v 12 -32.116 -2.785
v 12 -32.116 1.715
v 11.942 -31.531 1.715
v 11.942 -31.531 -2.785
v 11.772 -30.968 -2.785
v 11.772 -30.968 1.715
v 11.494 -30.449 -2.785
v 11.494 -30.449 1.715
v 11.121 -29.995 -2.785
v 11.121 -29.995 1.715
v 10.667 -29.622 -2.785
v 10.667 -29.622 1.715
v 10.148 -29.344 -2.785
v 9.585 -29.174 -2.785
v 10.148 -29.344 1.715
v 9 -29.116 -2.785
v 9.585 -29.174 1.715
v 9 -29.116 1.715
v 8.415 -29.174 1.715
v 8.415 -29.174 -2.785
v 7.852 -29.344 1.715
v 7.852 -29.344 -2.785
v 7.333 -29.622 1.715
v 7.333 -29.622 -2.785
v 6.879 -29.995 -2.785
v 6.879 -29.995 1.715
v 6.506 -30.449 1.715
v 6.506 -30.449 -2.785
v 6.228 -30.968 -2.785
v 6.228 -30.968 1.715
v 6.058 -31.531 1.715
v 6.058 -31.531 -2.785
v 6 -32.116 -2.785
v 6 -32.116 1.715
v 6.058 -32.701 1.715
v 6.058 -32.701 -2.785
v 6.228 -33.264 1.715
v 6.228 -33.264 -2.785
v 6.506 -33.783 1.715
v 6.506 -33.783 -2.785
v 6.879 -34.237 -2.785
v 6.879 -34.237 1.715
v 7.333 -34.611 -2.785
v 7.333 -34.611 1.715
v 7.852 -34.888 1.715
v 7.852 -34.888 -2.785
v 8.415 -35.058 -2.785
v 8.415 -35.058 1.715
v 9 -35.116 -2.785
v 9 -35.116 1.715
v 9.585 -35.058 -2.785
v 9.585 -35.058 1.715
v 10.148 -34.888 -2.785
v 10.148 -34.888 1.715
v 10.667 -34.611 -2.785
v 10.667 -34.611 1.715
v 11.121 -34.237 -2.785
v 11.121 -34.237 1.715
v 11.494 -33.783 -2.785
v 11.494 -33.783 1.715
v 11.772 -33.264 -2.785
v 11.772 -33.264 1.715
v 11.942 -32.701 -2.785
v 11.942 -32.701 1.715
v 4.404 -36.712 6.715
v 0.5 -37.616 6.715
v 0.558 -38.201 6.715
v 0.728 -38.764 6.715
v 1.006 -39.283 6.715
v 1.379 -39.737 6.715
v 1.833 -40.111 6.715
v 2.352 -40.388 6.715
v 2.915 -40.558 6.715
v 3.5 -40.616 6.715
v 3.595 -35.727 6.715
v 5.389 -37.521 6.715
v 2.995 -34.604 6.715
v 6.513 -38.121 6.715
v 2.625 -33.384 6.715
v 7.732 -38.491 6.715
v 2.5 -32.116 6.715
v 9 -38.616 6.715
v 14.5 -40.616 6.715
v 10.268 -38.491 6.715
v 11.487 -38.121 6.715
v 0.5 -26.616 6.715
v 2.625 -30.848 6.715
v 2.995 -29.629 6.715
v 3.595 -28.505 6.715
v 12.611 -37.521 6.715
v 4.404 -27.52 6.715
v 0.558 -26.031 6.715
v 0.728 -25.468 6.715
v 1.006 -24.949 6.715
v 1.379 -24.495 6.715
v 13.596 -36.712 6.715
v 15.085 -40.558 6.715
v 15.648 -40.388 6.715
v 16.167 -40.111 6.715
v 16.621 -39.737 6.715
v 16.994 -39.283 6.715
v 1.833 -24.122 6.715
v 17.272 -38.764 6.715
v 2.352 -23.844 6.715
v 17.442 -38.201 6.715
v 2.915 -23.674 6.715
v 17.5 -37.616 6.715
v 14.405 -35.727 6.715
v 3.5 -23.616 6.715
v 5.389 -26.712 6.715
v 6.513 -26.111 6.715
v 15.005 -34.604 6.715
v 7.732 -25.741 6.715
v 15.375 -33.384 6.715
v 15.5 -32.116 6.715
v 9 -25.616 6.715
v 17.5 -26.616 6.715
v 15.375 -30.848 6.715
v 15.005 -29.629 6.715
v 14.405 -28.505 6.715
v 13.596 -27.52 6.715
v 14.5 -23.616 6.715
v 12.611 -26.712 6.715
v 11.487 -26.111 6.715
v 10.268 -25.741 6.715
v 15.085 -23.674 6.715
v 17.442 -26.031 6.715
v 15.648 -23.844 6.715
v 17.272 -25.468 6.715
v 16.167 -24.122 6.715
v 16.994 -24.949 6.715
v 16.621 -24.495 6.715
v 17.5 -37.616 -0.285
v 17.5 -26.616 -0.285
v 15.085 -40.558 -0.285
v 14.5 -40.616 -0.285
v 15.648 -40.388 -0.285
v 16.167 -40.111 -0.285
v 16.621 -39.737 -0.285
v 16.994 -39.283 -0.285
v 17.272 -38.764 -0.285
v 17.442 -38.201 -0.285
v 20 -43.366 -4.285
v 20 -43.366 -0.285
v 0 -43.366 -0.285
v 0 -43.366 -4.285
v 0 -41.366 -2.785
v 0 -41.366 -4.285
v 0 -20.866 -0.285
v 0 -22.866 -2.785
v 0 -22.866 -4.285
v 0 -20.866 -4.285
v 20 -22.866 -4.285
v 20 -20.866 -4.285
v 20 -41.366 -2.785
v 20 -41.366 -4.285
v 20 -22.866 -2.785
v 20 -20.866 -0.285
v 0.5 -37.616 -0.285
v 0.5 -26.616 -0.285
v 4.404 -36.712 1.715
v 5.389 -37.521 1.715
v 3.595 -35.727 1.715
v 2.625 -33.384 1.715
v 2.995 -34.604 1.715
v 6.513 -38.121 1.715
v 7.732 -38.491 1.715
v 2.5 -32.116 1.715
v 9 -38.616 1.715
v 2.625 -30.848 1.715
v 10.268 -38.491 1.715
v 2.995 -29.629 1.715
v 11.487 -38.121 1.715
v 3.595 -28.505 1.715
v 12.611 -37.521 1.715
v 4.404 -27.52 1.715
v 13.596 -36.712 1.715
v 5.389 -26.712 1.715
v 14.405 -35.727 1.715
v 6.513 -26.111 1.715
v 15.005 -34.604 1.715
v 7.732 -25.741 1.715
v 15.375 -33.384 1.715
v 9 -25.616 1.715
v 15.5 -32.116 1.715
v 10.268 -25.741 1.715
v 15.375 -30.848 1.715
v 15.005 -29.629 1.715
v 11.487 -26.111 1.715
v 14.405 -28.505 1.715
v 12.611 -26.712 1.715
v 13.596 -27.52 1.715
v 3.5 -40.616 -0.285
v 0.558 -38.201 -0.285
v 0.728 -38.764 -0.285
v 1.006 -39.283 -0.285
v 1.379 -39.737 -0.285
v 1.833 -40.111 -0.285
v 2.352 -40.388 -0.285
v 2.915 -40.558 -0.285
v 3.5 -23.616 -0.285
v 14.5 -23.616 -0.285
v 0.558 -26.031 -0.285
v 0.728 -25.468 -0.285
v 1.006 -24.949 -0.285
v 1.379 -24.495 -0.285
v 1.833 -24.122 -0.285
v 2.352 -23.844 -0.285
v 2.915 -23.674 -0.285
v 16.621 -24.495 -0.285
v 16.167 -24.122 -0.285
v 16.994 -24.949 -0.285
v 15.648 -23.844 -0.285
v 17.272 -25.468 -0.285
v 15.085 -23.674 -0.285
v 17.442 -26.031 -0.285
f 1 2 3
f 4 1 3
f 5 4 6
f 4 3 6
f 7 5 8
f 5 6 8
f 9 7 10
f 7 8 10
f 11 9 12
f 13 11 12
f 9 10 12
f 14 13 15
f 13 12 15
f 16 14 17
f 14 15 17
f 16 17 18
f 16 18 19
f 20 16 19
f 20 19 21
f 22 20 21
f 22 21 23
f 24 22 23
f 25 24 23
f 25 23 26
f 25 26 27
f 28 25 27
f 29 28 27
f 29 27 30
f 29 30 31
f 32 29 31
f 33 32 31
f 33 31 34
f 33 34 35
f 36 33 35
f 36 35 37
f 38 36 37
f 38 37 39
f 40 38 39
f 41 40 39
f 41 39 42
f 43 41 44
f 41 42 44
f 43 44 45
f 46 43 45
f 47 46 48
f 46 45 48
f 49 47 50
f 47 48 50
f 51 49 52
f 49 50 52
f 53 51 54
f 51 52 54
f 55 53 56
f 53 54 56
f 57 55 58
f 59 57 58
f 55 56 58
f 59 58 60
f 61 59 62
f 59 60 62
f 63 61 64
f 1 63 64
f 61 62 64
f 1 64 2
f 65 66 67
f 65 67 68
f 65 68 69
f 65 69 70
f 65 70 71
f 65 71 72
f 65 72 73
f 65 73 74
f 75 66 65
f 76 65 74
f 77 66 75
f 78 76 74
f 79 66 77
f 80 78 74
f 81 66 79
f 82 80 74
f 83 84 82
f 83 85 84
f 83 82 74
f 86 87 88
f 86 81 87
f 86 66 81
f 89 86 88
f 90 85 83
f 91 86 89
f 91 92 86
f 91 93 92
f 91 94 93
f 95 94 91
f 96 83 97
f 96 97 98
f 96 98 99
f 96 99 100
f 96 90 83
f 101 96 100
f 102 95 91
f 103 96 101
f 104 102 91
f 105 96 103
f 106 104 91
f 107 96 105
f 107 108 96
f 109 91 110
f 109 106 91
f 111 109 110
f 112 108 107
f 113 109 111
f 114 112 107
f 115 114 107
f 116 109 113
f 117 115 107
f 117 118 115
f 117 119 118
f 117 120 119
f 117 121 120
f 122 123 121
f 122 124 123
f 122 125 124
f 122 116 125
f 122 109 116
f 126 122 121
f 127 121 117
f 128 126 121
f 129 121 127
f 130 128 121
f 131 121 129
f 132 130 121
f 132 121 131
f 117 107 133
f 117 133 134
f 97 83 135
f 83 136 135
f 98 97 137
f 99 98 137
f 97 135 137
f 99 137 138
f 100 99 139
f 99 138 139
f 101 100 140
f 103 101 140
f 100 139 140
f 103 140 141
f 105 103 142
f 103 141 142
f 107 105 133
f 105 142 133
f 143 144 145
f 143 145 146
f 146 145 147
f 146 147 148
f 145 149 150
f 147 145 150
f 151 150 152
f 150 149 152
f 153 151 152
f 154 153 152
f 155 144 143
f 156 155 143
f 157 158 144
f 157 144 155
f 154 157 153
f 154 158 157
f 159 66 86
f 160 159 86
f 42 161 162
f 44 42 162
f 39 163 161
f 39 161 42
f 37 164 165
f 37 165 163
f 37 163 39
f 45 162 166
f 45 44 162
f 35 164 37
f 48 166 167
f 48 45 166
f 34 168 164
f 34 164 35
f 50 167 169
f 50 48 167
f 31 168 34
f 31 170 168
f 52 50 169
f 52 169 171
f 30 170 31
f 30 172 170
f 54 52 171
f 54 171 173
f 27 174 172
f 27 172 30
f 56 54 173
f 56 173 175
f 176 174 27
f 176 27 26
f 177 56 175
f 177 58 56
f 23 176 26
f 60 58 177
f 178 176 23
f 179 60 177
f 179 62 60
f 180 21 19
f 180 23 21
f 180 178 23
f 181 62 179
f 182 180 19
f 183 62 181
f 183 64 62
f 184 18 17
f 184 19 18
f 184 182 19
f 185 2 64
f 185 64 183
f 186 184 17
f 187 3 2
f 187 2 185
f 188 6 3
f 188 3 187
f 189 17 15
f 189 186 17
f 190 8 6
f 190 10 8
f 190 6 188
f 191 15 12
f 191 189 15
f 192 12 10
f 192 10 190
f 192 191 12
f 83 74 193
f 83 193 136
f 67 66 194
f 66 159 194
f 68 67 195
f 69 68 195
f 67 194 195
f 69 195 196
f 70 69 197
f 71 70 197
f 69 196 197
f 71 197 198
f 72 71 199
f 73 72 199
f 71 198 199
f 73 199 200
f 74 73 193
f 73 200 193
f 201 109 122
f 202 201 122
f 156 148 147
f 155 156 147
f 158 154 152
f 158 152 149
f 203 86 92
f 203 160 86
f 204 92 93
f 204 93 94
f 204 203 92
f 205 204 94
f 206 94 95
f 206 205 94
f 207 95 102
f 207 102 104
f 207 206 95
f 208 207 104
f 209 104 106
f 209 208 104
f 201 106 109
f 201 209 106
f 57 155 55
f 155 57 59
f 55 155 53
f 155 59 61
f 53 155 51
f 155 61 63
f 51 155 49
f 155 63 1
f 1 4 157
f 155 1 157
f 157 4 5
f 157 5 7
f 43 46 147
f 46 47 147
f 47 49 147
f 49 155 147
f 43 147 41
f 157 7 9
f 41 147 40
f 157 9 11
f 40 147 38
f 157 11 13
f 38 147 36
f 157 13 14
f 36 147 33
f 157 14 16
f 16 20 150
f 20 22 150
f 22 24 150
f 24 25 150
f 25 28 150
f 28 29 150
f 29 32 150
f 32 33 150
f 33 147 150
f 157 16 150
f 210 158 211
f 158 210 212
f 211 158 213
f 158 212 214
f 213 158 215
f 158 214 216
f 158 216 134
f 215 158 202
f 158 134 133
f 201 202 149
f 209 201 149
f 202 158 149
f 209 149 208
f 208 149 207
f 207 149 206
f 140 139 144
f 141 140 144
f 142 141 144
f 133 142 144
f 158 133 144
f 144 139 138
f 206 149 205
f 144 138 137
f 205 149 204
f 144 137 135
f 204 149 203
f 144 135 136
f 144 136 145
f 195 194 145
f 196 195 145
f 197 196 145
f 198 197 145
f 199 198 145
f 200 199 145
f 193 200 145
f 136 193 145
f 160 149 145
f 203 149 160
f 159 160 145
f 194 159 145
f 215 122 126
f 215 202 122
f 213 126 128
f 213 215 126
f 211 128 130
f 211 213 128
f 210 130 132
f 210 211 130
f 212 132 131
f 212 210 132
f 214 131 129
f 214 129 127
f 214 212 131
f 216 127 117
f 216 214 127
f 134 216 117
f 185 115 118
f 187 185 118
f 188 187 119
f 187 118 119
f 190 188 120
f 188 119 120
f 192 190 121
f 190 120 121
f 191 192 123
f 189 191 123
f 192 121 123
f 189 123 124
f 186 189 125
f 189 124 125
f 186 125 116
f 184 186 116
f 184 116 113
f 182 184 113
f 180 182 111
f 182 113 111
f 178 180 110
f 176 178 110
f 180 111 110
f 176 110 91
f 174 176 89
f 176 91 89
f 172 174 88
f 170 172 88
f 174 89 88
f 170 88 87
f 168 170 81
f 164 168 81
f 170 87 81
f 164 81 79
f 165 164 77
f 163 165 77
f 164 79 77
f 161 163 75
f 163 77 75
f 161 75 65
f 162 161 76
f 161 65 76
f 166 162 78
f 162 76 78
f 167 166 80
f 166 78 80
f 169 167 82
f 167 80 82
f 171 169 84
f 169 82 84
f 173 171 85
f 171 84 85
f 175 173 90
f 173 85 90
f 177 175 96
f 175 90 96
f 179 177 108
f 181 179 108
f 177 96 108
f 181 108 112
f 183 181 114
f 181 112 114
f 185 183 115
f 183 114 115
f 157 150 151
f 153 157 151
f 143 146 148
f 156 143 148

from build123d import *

# Parameters (mm, degrees)
BOSS_EXTRUDE1_DEPTH = 20
SKETCH2_R           = 3
CUT_EXTRUDE1_DEPTH  = 3
BOSS_EXTRUDE2_START = 7
SKETCH3_W           = 17
SKETCH3_H           = 17
SKETCH3_R           = 3
BOSS_EXTRUDE2_DEPTH = 7
SKETCH4_R           = 6.5
CUT_EXTRUDE2_DEPTH  = 5
FILLET1_R           = 3


with BuildPart() as part:
    # Sketch1 → Boss-Extrude1 (new body)
    with BuildSketch(Plane(origin=(0, 0, 0), x_dir=(0, 0, -1), z_dir=(1, 0, 0))):
        Polygon((2.785388085, -22.866116346), (4.285388085, -22.866116346), (4.285388085, -20.866116346), (0.285388085, -20.866116346), (0.285388085, -43.366116346), (4.285388085, -43.366116346), (4.285388085, -41.366116346), (2.785388085, -41.366116346), align=None)
    extrude(amount=BOSS_EXTRUDE1_DEPTH)

    # Sketch2 → Cut-Extrude1 (cut)
    with BuildSketch(Plane.XY.offset(-0.285388085)):
        with Locations((9, -32.116116346)):
            Circle(SKETCH2_R)
    extrude(amount=-CUT_EXTRUDE1_DEPTH, mode=Mode.SUBTRACT)

    # Sketch3 → Boss-Extrude2 (add)
    with BuildSketch(Plane.XY.offset(-0.285388085).offset(BOSS_EXTRUDE2_START)):
        with Locations((9, -32.116116346)):
            Rectangle(SKETCH3_W, SKETCH3_H)
        with Locations((9, -32.116116346)):
            Circle(SKETCH3_R, mode=Mode.SUBTRACT)
    extrude(amount=-BOSS_EXTRUDE2_DEPTH)

    # Sketch4 → Cut-Extrude2 (cut)
    with BuildSketch(Plane.XY.offset(6.714611915)):
        with Locations((9, -32.116116346)):
            Circle(SKETCH4_R)
    extrude(amount=-CUT_EXTRUDE2_DEPTH, mode=Mode.SUBTRACT)

    # Fillet1
    fillet1_edges = [part.edges().sort_by_distance(p)[0] for p in [
        (0.5, -23.616116346, 3.214611915),
        (0.5, -40.616116346, 3.214611915),
        (17.5, -40.616116346, 3.214611915),
        (17.5, -23.616116346, 3.214611915),
    ]]
    fillet(fillet1_edges, radius=FILLET1_R)


solid = part.part
